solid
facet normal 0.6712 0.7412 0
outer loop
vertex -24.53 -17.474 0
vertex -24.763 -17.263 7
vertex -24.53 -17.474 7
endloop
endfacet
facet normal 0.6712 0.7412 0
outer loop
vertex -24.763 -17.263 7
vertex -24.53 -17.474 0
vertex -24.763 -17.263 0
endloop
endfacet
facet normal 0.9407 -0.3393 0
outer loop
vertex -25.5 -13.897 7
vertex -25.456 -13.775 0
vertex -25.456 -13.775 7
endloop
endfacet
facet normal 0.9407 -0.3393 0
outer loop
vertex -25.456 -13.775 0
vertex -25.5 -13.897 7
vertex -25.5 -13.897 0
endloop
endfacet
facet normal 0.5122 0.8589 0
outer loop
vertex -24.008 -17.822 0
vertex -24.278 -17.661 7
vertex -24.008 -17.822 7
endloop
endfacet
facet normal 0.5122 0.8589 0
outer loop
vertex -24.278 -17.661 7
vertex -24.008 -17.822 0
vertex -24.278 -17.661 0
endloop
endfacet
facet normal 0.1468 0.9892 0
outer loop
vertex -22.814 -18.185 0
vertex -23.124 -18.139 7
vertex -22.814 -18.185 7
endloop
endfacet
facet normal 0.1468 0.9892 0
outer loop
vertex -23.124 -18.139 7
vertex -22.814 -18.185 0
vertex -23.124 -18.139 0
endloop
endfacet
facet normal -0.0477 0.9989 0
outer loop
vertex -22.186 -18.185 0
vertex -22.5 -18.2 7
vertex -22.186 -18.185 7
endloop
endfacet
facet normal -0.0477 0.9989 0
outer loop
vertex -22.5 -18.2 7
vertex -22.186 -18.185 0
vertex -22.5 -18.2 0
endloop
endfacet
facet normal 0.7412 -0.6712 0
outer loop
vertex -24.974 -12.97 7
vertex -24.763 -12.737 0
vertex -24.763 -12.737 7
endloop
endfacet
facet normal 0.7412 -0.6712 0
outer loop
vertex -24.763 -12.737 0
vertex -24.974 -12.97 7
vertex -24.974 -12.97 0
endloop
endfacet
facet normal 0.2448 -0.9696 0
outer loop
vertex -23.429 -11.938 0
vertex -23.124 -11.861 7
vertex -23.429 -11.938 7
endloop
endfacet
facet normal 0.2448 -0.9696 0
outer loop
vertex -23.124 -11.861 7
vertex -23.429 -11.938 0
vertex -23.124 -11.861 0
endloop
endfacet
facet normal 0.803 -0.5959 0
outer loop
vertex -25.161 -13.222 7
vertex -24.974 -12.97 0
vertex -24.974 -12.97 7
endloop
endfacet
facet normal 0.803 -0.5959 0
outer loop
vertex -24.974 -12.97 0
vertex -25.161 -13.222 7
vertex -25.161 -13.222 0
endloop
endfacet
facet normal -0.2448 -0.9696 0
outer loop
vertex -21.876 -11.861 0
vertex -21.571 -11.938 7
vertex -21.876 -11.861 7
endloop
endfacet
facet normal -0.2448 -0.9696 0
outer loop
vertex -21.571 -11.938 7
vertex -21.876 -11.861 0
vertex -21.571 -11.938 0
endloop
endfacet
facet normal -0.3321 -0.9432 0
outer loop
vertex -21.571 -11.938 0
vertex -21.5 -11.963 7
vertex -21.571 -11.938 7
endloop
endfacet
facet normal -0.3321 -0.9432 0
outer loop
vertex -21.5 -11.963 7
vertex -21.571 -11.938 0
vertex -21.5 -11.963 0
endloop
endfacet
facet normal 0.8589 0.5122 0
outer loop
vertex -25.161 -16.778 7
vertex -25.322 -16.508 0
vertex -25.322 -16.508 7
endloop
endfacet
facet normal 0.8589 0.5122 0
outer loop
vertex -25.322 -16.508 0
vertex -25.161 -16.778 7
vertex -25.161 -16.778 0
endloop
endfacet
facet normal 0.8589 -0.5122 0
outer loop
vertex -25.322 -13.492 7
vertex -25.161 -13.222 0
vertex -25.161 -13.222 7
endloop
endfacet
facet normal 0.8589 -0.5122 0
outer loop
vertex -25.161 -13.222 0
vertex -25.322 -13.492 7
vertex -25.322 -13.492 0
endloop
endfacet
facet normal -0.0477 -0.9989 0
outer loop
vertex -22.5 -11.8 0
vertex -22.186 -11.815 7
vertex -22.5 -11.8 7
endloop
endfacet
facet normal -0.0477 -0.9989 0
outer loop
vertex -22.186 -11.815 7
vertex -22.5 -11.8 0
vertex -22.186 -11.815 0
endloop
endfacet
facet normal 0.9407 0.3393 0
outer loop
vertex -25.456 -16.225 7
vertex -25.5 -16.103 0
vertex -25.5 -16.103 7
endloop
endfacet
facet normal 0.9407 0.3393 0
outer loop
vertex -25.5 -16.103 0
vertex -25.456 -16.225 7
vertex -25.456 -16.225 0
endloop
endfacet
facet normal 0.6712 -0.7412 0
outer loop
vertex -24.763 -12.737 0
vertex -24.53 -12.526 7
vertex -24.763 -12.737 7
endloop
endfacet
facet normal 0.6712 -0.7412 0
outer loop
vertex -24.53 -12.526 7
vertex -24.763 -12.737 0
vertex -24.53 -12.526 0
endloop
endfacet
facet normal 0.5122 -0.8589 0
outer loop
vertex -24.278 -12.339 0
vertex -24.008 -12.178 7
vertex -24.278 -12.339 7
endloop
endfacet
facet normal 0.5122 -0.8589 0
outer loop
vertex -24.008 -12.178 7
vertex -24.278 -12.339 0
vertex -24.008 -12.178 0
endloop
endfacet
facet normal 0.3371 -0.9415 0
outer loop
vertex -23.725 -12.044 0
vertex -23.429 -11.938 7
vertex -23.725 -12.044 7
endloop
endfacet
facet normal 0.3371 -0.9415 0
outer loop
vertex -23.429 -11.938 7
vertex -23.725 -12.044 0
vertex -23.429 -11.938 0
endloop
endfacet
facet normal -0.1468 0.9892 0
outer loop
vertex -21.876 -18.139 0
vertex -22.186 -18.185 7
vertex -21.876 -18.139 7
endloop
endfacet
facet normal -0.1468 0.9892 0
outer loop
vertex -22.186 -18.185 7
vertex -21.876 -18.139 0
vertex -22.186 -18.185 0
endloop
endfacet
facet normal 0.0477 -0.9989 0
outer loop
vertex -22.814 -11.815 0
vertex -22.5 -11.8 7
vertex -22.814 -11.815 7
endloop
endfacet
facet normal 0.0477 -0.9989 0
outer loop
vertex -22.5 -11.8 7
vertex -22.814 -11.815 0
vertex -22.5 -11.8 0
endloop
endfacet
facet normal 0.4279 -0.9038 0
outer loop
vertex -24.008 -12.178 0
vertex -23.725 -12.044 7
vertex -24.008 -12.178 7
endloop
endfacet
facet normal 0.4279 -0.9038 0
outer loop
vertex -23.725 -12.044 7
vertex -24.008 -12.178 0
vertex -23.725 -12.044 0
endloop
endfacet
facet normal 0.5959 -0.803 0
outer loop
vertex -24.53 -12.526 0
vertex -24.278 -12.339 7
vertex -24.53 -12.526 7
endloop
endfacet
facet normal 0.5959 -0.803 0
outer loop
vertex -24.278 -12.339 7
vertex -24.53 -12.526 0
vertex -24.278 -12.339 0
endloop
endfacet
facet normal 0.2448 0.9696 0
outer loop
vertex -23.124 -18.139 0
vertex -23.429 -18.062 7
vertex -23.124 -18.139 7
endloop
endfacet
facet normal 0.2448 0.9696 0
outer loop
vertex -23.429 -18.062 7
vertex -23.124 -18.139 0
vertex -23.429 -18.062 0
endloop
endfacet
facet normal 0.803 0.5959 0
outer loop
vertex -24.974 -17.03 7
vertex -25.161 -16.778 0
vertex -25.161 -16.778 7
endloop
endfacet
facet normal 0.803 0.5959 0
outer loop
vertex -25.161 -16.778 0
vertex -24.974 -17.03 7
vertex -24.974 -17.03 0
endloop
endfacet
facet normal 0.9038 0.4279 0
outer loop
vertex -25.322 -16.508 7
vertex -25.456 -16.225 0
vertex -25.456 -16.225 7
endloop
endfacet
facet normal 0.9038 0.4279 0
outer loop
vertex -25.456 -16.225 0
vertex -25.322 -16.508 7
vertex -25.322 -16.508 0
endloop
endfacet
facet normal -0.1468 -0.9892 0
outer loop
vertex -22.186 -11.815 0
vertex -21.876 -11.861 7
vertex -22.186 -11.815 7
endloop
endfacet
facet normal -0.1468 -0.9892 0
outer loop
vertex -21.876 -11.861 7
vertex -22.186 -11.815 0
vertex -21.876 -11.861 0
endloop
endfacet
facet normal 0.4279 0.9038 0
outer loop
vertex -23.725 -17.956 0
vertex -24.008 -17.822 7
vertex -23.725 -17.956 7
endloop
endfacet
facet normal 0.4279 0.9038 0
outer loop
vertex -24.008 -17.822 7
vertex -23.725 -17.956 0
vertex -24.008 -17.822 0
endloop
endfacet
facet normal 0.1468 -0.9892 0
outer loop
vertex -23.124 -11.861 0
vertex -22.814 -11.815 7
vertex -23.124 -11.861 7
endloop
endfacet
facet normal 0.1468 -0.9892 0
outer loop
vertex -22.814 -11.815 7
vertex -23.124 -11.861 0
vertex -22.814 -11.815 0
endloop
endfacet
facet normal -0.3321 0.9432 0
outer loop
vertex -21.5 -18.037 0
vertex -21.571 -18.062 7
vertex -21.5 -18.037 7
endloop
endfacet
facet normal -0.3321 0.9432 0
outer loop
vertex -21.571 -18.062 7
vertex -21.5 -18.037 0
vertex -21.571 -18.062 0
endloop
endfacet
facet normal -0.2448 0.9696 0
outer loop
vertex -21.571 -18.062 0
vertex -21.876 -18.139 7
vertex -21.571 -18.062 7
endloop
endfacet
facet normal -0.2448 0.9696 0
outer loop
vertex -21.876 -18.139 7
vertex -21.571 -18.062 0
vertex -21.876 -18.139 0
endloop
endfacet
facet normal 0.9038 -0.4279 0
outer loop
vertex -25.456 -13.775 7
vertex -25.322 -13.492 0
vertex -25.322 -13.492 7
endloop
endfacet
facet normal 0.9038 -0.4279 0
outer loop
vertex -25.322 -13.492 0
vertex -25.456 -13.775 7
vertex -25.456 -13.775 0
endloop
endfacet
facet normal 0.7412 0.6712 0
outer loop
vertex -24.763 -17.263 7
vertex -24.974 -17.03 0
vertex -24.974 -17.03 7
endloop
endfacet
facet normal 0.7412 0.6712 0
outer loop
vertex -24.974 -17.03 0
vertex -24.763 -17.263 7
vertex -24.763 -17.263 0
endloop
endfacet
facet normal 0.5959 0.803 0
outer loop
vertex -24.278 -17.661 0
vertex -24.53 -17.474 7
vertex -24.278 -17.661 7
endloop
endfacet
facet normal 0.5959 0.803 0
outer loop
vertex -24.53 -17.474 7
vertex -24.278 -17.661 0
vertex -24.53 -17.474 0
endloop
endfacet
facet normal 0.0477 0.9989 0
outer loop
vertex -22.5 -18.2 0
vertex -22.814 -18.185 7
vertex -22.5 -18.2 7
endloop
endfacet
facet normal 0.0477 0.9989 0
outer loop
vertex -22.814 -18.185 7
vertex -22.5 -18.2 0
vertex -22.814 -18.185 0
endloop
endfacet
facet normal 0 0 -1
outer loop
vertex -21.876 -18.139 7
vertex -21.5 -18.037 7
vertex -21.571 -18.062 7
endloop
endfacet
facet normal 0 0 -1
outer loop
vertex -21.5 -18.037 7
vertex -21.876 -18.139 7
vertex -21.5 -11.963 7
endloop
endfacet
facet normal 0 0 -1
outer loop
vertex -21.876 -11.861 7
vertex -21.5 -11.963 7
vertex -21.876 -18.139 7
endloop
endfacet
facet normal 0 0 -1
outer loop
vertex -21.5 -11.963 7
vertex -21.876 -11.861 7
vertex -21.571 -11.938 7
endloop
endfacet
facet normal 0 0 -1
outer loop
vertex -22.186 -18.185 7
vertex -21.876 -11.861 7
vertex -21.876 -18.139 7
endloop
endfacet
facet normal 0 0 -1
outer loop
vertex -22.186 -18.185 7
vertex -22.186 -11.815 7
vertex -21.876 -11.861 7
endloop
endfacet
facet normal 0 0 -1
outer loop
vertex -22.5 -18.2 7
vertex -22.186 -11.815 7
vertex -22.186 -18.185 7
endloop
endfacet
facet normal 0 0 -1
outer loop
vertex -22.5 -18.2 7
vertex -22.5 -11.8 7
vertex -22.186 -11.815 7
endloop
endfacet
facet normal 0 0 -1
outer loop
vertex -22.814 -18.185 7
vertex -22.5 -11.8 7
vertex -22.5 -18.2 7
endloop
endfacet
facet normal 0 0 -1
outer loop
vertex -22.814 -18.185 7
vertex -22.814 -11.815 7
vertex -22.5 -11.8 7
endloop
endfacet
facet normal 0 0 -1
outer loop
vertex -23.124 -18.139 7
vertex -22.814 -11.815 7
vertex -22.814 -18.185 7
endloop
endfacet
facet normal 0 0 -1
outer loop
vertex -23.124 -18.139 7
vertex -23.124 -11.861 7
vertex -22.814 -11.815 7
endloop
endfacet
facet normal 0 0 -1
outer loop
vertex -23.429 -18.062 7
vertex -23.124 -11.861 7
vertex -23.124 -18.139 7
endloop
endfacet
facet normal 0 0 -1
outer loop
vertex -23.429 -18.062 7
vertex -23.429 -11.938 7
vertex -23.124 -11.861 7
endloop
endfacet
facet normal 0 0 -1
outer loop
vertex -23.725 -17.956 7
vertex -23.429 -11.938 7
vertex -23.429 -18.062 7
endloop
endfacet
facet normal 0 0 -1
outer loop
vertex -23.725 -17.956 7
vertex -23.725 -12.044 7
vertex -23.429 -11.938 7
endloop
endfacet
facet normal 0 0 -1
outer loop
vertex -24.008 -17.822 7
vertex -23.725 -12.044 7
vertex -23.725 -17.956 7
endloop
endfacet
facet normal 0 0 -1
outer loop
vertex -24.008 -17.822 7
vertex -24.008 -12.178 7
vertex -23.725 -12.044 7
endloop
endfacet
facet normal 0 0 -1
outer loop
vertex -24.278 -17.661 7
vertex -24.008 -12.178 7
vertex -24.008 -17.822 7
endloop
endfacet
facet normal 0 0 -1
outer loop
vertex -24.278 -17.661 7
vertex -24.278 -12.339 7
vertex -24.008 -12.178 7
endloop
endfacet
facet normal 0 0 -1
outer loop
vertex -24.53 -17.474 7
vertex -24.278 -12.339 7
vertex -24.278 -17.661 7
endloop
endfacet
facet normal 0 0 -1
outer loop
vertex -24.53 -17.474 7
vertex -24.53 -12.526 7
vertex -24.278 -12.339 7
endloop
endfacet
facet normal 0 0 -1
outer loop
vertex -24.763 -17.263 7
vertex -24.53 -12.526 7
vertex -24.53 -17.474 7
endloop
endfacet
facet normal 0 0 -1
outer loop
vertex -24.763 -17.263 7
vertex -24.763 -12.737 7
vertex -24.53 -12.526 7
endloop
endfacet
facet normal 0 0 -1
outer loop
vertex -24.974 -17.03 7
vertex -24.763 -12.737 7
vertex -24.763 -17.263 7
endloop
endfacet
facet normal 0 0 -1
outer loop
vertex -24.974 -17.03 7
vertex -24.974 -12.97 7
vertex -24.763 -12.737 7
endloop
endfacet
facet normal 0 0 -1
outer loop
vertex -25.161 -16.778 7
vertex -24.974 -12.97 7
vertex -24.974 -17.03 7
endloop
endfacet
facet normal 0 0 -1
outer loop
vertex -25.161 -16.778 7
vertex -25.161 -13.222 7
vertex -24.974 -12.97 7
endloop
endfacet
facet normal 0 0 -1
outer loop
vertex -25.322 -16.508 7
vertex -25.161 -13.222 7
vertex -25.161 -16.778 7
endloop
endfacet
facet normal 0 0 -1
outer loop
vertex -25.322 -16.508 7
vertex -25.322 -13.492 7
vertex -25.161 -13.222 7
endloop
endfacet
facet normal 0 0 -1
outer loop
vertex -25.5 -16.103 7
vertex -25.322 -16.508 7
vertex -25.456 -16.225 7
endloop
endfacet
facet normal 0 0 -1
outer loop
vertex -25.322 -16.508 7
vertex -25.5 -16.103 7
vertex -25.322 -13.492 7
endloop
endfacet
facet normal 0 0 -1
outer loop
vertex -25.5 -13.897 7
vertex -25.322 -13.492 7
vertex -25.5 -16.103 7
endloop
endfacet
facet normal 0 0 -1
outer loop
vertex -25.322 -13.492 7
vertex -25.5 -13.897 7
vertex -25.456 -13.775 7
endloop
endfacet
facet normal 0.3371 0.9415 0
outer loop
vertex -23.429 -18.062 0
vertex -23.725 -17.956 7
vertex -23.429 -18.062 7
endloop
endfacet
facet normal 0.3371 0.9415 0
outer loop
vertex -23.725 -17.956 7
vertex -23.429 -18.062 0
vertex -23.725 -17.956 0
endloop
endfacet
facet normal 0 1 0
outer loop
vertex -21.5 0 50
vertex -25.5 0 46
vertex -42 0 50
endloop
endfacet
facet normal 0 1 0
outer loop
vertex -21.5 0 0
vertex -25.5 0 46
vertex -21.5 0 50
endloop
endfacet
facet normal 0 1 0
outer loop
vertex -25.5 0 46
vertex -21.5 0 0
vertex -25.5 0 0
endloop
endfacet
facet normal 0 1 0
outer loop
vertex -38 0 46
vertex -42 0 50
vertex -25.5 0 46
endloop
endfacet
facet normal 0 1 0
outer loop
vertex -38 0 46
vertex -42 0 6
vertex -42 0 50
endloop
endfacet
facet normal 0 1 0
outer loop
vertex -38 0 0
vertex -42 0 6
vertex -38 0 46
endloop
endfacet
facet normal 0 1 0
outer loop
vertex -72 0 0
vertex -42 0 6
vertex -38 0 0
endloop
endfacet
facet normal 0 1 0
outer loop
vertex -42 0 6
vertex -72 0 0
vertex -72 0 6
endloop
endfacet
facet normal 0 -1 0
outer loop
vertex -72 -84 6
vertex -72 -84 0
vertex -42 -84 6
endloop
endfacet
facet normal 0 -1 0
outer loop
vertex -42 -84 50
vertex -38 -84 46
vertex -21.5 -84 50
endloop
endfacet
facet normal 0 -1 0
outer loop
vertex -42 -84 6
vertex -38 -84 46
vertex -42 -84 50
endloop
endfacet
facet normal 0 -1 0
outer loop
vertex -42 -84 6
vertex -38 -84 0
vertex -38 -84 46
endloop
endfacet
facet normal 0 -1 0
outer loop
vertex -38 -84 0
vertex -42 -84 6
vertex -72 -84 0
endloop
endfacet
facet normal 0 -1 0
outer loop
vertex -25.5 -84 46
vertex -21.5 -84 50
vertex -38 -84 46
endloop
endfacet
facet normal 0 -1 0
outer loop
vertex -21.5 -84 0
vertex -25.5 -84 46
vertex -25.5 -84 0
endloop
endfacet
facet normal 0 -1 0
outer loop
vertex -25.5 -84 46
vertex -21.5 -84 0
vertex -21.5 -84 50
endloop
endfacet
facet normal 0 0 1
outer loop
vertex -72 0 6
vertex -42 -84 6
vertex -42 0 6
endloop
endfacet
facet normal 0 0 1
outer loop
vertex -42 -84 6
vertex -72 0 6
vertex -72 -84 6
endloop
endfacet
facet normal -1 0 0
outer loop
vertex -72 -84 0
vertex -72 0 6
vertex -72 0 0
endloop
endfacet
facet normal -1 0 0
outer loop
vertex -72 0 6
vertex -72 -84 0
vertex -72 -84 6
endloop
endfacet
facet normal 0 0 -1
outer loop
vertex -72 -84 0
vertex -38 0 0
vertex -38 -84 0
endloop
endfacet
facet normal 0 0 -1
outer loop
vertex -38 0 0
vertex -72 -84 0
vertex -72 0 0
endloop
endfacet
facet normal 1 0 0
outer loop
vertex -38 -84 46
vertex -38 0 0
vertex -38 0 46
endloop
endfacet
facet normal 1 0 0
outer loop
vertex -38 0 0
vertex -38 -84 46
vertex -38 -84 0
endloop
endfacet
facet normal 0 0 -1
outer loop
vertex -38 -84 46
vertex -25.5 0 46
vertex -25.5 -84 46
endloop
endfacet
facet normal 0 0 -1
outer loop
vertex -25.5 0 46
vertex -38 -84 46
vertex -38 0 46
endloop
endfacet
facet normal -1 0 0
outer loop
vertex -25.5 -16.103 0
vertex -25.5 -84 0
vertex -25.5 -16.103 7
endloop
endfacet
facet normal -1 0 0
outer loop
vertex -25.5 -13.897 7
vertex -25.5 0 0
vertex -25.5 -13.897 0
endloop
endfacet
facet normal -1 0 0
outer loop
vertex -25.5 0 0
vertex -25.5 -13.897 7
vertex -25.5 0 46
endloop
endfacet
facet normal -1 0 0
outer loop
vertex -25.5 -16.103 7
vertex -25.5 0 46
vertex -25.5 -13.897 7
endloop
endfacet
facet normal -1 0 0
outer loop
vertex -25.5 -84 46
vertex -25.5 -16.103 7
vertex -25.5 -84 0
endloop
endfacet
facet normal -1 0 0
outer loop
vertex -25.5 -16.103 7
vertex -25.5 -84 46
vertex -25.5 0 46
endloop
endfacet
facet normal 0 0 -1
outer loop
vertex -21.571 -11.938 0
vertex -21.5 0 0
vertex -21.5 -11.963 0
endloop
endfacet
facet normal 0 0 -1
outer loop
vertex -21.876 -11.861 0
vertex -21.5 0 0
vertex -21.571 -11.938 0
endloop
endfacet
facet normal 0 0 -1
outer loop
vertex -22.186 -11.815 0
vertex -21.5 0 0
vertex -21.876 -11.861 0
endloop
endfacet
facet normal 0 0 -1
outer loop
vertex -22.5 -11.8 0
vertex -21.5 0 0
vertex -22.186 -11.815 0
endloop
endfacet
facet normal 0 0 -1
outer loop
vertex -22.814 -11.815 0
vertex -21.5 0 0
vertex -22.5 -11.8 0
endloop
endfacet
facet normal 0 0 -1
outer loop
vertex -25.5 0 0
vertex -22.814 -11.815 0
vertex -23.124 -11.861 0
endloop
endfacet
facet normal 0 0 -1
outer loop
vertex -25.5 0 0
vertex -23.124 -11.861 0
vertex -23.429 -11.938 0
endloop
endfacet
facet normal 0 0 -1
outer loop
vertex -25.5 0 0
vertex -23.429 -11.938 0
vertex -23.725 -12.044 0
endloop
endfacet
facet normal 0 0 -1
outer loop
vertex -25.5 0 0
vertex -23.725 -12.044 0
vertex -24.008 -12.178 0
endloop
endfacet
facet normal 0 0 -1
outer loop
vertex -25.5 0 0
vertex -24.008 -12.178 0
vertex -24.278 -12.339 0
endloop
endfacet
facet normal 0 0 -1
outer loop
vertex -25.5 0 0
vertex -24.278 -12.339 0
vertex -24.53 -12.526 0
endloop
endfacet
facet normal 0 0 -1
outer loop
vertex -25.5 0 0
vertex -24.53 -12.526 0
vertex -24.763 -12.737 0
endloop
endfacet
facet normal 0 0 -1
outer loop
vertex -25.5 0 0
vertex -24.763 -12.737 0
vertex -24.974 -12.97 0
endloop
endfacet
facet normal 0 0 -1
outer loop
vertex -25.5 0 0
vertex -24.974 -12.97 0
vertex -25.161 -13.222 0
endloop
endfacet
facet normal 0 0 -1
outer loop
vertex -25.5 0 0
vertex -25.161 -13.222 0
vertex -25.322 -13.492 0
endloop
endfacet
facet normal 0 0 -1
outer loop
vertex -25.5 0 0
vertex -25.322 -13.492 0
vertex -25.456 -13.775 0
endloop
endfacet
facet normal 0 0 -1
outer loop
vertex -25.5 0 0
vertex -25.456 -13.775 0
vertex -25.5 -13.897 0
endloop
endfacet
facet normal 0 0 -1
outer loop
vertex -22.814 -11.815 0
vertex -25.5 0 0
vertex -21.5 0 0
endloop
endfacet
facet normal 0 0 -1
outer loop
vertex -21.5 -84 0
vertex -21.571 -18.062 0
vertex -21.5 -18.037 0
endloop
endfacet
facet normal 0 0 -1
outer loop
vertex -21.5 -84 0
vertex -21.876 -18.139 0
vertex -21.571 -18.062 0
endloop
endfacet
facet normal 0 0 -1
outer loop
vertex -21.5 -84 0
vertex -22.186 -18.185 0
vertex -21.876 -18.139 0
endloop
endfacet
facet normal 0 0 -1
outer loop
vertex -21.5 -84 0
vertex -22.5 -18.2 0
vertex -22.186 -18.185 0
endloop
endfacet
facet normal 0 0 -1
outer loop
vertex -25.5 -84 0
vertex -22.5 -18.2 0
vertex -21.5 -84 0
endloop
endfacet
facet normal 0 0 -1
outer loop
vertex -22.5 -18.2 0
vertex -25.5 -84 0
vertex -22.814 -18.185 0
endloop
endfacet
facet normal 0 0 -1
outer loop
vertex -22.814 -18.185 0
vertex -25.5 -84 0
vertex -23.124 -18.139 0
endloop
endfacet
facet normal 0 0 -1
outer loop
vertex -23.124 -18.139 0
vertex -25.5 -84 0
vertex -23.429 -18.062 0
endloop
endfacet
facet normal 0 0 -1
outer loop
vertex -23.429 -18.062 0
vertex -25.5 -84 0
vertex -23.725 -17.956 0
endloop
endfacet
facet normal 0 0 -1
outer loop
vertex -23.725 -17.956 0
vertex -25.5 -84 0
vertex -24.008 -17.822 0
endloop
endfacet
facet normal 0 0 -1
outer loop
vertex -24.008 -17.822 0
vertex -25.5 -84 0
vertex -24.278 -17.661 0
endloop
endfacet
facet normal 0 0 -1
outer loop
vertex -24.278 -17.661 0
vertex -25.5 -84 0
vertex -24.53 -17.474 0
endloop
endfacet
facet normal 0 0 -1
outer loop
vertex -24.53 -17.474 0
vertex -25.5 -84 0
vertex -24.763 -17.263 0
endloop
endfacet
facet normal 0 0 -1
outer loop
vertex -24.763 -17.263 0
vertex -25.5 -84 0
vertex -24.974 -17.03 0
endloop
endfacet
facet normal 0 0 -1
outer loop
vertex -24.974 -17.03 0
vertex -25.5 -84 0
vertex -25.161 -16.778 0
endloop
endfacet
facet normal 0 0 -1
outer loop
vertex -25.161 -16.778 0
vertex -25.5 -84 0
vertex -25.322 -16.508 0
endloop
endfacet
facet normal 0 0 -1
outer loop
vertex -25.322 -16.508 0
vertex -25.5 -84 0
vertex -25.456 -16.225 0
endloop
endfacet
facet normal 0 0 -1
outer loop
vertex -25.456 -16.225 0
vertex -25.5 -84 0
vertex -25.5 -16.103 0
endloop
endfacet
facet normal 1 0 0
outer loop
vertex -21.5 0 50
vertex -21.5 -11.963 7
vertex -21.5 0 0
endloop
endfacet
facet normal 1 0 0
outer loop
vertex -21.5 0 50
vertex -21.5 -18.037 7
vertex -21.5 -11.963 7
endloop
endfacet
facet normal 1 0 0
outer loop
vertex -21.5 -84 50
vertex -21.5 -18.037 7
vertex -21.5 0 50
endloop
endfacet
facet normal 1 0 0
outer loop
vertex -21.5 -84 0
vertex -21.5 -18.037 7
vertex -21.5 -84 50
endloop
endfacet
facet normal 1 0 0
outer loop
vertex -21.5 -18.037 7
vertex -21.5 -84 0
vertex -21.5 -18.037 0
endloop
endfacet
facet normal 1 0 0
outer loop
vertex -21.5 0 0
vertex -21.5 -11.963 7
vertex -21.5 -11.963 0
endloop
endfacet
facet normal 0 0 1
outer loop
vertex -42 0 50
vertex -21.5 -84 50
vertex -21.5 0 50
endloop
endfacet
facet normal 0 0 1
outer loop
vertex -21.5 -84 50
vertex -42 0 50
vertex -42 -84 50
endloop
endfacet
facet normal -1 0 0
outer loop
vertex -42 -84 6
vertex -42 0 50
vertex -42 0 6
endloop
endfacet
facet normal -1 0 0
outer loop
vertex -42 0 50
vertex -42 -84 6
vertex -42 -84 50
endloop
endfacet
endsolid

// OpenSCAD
// PCR Strip Holder for Ice Bucket
// Designed to hang over a 12mm wall and hold an 8-tube PCR strip.
// The part is extruded 84mm along the X axis.
// The profile is in the YZ plane.

// --- Dimensions ---
length_x        = 84.0;    // Total extrusion length along X
wall_gap        = 12.5;    // Gap for the bucket wall (16.5 - 4.0)
inner_leg_h      = 50.0;    // Height of the inner leg
outer_leg_h      = 50.0;    // Height of the outer leg
bridge_h         = 4.0;     // Thickness of the top bridge (50 - 46)
inner_leg_w      = 4.0;     // Width of the inner leg (y = 0 to 4)
outer_leg_w      = 4.0;     // Width of the outer leg (y = 16.5 to 20.5)
ledge_thick      = 6.0;     // Thickness of the ledge (z = 0 to 6)
ledge_depth      = 30.0;    // Depth of the ledge into the ice (y = 0 to -30)
tube_hole_d      = 6.4;     // Diameter of the PCR tube holes
tube_hole_pitch  = 9.0;     // Spacing between tube holes along X
num_tubes        = 8;       // Number of tubes

$fn = 64;

// --- 2D Profile ---
// We define the profile in the XY plane where:
// X_2d = Y_profile (the width/depth dimension)
// Y_2d = Z_profile (the height dimension)
module profile_2d() {
    union() {
        // Inner Leg: y [0, 4], z [0, 50]
        square([inner_leg_w, inner_leg_h]);
        
        // Outer Leg: y [16.5, 20.5], z [0, 50]
        translate([16.5, 0]) square([outer_leg_w, outer_leg_h]);
        
        // Bridge: y [4, 16.5], z [46, 50]
        translate([4, 46]) square([12.5, bridge_h]);
        
        // Ledge: y [-30, 0], z [0, 6]
        translate([-ledge_depth, 0]) square([ledge_depth, ledge_thick]);
    }
}

// --- 3D Construction ---
// 1. Create the main body by extruding the 2D profile along Z.
// 2. Rotate the extrusion so it lies along the X axis.
// 3. Center it on X.
// 4. Subtract the vertical holes.

difference() {
    // The Main Body
    // We extrude the profile along Z (which is the height of the legs).
    // Then we rotate it 90 degrees around the Y axis so the extrusion direction (Z) becomes X.
    // We translate it by -length_x/2 to center it on X=0.
    rotate([90, 0, 0])
    translate([-length_x/2, 0, 0])
    linear_extrude(height = length_x) {
        profile_2d();
    }

    // The Holes
    // The holes are vertical (along the Z axis).
    // In the 2D profile (XY), the ledge is at X [-30, 0] and Y [0, 6].
    // After the rotation rotate([90, 0, 0]), the original X becomes Z, 
    // and the original Y becomes Y.
    // So the ledge is at Z [-30, 0] and Y [0, 6].
    // The user wants the holes at y = -15 (in the profile's YZ plane).
    // In our 2D profile, the "Y" of the profile is the "Y" of the world.
    // Wait, let's re-map:
    // Profile X -> World Z
    // Profile Y -> World Y
    // Profile Z (extrusion) -> World X
    
    // Let's use a more robust mapping:
    // We want holes at:
    // X_world = centered on 0
    // Y_world = -15 (the ledge center in the YZ plane)
    // Z_world = vertical (through the ledge)
    
    // In our current rotation:
    // World X = Profile Z
    // World Y = Profile Y
    // World Z = Profile X
    
    // User wants holes at:
    // X_world = centered on 0
    // Y_world = -15 (ledge depth)
    // Z_world = vertical (through the ledge)
    
    // Let's re-orient the profile to match the user's description exactly:
    // Profile in YZ plane. Extruded along X.
    // This means:
    // World X = Extrusion
    // World Y = Profile Y
    // World Z = Profile Z
    
    // Let's redefine the 2D profile to be in the YZ plane directly.
    // Since OpenSCAD 2D is XY, we define it in XY and then rotate.
    // To make World Z = Profile Z, we use:
    // 2D_X = Profile Y
    // 2D_Y = Profile Z
    // Then rotate 90 deg around Y so 2D_Z becomes World X.
    
    // Let's use the mapping:
    // 2D_X = Profile Y
    // 2D_Y = Profile Z
    // Extrude along Z (which becomes World X)
    // This makes:
    // World X = Extrusion
    // World Y = 2D_X = Profile Y
    // World Z = 2D_Y = Profile Z
    
    // This matches the user's request perfectly.
    // Now, where are the holes?
    // Holes are vertical (World Z).
    // They are at Y_world = -15.
    // They are at X_world = centered on 0.
    
    // In our 2D profile:
    // Y_world = 2D_X. So 2D_X = -15.
    // X_world = Extrusion. So we need to subtract cylinders along Z.
    
    for (i = [0 : num_tubes - 1]) {
        let (x_pos = (i - (num_tubes - 1) / 2) * tube_hole_pitch)
        translate([x_pos, -15, -1]) // X_world = x_pos, Y_world = -15
        cylinder(h = ledge_thick + 2, d = tube_hole_d);
    }
}

// Final check on orientation:
// The extrusion is along X.
// The profile is in the YZ plane.
// The ledge is at Y = -30 to 0.
// The holes are at Y = -15.
// The holes are vertical (along Z).
// This matches the request.
